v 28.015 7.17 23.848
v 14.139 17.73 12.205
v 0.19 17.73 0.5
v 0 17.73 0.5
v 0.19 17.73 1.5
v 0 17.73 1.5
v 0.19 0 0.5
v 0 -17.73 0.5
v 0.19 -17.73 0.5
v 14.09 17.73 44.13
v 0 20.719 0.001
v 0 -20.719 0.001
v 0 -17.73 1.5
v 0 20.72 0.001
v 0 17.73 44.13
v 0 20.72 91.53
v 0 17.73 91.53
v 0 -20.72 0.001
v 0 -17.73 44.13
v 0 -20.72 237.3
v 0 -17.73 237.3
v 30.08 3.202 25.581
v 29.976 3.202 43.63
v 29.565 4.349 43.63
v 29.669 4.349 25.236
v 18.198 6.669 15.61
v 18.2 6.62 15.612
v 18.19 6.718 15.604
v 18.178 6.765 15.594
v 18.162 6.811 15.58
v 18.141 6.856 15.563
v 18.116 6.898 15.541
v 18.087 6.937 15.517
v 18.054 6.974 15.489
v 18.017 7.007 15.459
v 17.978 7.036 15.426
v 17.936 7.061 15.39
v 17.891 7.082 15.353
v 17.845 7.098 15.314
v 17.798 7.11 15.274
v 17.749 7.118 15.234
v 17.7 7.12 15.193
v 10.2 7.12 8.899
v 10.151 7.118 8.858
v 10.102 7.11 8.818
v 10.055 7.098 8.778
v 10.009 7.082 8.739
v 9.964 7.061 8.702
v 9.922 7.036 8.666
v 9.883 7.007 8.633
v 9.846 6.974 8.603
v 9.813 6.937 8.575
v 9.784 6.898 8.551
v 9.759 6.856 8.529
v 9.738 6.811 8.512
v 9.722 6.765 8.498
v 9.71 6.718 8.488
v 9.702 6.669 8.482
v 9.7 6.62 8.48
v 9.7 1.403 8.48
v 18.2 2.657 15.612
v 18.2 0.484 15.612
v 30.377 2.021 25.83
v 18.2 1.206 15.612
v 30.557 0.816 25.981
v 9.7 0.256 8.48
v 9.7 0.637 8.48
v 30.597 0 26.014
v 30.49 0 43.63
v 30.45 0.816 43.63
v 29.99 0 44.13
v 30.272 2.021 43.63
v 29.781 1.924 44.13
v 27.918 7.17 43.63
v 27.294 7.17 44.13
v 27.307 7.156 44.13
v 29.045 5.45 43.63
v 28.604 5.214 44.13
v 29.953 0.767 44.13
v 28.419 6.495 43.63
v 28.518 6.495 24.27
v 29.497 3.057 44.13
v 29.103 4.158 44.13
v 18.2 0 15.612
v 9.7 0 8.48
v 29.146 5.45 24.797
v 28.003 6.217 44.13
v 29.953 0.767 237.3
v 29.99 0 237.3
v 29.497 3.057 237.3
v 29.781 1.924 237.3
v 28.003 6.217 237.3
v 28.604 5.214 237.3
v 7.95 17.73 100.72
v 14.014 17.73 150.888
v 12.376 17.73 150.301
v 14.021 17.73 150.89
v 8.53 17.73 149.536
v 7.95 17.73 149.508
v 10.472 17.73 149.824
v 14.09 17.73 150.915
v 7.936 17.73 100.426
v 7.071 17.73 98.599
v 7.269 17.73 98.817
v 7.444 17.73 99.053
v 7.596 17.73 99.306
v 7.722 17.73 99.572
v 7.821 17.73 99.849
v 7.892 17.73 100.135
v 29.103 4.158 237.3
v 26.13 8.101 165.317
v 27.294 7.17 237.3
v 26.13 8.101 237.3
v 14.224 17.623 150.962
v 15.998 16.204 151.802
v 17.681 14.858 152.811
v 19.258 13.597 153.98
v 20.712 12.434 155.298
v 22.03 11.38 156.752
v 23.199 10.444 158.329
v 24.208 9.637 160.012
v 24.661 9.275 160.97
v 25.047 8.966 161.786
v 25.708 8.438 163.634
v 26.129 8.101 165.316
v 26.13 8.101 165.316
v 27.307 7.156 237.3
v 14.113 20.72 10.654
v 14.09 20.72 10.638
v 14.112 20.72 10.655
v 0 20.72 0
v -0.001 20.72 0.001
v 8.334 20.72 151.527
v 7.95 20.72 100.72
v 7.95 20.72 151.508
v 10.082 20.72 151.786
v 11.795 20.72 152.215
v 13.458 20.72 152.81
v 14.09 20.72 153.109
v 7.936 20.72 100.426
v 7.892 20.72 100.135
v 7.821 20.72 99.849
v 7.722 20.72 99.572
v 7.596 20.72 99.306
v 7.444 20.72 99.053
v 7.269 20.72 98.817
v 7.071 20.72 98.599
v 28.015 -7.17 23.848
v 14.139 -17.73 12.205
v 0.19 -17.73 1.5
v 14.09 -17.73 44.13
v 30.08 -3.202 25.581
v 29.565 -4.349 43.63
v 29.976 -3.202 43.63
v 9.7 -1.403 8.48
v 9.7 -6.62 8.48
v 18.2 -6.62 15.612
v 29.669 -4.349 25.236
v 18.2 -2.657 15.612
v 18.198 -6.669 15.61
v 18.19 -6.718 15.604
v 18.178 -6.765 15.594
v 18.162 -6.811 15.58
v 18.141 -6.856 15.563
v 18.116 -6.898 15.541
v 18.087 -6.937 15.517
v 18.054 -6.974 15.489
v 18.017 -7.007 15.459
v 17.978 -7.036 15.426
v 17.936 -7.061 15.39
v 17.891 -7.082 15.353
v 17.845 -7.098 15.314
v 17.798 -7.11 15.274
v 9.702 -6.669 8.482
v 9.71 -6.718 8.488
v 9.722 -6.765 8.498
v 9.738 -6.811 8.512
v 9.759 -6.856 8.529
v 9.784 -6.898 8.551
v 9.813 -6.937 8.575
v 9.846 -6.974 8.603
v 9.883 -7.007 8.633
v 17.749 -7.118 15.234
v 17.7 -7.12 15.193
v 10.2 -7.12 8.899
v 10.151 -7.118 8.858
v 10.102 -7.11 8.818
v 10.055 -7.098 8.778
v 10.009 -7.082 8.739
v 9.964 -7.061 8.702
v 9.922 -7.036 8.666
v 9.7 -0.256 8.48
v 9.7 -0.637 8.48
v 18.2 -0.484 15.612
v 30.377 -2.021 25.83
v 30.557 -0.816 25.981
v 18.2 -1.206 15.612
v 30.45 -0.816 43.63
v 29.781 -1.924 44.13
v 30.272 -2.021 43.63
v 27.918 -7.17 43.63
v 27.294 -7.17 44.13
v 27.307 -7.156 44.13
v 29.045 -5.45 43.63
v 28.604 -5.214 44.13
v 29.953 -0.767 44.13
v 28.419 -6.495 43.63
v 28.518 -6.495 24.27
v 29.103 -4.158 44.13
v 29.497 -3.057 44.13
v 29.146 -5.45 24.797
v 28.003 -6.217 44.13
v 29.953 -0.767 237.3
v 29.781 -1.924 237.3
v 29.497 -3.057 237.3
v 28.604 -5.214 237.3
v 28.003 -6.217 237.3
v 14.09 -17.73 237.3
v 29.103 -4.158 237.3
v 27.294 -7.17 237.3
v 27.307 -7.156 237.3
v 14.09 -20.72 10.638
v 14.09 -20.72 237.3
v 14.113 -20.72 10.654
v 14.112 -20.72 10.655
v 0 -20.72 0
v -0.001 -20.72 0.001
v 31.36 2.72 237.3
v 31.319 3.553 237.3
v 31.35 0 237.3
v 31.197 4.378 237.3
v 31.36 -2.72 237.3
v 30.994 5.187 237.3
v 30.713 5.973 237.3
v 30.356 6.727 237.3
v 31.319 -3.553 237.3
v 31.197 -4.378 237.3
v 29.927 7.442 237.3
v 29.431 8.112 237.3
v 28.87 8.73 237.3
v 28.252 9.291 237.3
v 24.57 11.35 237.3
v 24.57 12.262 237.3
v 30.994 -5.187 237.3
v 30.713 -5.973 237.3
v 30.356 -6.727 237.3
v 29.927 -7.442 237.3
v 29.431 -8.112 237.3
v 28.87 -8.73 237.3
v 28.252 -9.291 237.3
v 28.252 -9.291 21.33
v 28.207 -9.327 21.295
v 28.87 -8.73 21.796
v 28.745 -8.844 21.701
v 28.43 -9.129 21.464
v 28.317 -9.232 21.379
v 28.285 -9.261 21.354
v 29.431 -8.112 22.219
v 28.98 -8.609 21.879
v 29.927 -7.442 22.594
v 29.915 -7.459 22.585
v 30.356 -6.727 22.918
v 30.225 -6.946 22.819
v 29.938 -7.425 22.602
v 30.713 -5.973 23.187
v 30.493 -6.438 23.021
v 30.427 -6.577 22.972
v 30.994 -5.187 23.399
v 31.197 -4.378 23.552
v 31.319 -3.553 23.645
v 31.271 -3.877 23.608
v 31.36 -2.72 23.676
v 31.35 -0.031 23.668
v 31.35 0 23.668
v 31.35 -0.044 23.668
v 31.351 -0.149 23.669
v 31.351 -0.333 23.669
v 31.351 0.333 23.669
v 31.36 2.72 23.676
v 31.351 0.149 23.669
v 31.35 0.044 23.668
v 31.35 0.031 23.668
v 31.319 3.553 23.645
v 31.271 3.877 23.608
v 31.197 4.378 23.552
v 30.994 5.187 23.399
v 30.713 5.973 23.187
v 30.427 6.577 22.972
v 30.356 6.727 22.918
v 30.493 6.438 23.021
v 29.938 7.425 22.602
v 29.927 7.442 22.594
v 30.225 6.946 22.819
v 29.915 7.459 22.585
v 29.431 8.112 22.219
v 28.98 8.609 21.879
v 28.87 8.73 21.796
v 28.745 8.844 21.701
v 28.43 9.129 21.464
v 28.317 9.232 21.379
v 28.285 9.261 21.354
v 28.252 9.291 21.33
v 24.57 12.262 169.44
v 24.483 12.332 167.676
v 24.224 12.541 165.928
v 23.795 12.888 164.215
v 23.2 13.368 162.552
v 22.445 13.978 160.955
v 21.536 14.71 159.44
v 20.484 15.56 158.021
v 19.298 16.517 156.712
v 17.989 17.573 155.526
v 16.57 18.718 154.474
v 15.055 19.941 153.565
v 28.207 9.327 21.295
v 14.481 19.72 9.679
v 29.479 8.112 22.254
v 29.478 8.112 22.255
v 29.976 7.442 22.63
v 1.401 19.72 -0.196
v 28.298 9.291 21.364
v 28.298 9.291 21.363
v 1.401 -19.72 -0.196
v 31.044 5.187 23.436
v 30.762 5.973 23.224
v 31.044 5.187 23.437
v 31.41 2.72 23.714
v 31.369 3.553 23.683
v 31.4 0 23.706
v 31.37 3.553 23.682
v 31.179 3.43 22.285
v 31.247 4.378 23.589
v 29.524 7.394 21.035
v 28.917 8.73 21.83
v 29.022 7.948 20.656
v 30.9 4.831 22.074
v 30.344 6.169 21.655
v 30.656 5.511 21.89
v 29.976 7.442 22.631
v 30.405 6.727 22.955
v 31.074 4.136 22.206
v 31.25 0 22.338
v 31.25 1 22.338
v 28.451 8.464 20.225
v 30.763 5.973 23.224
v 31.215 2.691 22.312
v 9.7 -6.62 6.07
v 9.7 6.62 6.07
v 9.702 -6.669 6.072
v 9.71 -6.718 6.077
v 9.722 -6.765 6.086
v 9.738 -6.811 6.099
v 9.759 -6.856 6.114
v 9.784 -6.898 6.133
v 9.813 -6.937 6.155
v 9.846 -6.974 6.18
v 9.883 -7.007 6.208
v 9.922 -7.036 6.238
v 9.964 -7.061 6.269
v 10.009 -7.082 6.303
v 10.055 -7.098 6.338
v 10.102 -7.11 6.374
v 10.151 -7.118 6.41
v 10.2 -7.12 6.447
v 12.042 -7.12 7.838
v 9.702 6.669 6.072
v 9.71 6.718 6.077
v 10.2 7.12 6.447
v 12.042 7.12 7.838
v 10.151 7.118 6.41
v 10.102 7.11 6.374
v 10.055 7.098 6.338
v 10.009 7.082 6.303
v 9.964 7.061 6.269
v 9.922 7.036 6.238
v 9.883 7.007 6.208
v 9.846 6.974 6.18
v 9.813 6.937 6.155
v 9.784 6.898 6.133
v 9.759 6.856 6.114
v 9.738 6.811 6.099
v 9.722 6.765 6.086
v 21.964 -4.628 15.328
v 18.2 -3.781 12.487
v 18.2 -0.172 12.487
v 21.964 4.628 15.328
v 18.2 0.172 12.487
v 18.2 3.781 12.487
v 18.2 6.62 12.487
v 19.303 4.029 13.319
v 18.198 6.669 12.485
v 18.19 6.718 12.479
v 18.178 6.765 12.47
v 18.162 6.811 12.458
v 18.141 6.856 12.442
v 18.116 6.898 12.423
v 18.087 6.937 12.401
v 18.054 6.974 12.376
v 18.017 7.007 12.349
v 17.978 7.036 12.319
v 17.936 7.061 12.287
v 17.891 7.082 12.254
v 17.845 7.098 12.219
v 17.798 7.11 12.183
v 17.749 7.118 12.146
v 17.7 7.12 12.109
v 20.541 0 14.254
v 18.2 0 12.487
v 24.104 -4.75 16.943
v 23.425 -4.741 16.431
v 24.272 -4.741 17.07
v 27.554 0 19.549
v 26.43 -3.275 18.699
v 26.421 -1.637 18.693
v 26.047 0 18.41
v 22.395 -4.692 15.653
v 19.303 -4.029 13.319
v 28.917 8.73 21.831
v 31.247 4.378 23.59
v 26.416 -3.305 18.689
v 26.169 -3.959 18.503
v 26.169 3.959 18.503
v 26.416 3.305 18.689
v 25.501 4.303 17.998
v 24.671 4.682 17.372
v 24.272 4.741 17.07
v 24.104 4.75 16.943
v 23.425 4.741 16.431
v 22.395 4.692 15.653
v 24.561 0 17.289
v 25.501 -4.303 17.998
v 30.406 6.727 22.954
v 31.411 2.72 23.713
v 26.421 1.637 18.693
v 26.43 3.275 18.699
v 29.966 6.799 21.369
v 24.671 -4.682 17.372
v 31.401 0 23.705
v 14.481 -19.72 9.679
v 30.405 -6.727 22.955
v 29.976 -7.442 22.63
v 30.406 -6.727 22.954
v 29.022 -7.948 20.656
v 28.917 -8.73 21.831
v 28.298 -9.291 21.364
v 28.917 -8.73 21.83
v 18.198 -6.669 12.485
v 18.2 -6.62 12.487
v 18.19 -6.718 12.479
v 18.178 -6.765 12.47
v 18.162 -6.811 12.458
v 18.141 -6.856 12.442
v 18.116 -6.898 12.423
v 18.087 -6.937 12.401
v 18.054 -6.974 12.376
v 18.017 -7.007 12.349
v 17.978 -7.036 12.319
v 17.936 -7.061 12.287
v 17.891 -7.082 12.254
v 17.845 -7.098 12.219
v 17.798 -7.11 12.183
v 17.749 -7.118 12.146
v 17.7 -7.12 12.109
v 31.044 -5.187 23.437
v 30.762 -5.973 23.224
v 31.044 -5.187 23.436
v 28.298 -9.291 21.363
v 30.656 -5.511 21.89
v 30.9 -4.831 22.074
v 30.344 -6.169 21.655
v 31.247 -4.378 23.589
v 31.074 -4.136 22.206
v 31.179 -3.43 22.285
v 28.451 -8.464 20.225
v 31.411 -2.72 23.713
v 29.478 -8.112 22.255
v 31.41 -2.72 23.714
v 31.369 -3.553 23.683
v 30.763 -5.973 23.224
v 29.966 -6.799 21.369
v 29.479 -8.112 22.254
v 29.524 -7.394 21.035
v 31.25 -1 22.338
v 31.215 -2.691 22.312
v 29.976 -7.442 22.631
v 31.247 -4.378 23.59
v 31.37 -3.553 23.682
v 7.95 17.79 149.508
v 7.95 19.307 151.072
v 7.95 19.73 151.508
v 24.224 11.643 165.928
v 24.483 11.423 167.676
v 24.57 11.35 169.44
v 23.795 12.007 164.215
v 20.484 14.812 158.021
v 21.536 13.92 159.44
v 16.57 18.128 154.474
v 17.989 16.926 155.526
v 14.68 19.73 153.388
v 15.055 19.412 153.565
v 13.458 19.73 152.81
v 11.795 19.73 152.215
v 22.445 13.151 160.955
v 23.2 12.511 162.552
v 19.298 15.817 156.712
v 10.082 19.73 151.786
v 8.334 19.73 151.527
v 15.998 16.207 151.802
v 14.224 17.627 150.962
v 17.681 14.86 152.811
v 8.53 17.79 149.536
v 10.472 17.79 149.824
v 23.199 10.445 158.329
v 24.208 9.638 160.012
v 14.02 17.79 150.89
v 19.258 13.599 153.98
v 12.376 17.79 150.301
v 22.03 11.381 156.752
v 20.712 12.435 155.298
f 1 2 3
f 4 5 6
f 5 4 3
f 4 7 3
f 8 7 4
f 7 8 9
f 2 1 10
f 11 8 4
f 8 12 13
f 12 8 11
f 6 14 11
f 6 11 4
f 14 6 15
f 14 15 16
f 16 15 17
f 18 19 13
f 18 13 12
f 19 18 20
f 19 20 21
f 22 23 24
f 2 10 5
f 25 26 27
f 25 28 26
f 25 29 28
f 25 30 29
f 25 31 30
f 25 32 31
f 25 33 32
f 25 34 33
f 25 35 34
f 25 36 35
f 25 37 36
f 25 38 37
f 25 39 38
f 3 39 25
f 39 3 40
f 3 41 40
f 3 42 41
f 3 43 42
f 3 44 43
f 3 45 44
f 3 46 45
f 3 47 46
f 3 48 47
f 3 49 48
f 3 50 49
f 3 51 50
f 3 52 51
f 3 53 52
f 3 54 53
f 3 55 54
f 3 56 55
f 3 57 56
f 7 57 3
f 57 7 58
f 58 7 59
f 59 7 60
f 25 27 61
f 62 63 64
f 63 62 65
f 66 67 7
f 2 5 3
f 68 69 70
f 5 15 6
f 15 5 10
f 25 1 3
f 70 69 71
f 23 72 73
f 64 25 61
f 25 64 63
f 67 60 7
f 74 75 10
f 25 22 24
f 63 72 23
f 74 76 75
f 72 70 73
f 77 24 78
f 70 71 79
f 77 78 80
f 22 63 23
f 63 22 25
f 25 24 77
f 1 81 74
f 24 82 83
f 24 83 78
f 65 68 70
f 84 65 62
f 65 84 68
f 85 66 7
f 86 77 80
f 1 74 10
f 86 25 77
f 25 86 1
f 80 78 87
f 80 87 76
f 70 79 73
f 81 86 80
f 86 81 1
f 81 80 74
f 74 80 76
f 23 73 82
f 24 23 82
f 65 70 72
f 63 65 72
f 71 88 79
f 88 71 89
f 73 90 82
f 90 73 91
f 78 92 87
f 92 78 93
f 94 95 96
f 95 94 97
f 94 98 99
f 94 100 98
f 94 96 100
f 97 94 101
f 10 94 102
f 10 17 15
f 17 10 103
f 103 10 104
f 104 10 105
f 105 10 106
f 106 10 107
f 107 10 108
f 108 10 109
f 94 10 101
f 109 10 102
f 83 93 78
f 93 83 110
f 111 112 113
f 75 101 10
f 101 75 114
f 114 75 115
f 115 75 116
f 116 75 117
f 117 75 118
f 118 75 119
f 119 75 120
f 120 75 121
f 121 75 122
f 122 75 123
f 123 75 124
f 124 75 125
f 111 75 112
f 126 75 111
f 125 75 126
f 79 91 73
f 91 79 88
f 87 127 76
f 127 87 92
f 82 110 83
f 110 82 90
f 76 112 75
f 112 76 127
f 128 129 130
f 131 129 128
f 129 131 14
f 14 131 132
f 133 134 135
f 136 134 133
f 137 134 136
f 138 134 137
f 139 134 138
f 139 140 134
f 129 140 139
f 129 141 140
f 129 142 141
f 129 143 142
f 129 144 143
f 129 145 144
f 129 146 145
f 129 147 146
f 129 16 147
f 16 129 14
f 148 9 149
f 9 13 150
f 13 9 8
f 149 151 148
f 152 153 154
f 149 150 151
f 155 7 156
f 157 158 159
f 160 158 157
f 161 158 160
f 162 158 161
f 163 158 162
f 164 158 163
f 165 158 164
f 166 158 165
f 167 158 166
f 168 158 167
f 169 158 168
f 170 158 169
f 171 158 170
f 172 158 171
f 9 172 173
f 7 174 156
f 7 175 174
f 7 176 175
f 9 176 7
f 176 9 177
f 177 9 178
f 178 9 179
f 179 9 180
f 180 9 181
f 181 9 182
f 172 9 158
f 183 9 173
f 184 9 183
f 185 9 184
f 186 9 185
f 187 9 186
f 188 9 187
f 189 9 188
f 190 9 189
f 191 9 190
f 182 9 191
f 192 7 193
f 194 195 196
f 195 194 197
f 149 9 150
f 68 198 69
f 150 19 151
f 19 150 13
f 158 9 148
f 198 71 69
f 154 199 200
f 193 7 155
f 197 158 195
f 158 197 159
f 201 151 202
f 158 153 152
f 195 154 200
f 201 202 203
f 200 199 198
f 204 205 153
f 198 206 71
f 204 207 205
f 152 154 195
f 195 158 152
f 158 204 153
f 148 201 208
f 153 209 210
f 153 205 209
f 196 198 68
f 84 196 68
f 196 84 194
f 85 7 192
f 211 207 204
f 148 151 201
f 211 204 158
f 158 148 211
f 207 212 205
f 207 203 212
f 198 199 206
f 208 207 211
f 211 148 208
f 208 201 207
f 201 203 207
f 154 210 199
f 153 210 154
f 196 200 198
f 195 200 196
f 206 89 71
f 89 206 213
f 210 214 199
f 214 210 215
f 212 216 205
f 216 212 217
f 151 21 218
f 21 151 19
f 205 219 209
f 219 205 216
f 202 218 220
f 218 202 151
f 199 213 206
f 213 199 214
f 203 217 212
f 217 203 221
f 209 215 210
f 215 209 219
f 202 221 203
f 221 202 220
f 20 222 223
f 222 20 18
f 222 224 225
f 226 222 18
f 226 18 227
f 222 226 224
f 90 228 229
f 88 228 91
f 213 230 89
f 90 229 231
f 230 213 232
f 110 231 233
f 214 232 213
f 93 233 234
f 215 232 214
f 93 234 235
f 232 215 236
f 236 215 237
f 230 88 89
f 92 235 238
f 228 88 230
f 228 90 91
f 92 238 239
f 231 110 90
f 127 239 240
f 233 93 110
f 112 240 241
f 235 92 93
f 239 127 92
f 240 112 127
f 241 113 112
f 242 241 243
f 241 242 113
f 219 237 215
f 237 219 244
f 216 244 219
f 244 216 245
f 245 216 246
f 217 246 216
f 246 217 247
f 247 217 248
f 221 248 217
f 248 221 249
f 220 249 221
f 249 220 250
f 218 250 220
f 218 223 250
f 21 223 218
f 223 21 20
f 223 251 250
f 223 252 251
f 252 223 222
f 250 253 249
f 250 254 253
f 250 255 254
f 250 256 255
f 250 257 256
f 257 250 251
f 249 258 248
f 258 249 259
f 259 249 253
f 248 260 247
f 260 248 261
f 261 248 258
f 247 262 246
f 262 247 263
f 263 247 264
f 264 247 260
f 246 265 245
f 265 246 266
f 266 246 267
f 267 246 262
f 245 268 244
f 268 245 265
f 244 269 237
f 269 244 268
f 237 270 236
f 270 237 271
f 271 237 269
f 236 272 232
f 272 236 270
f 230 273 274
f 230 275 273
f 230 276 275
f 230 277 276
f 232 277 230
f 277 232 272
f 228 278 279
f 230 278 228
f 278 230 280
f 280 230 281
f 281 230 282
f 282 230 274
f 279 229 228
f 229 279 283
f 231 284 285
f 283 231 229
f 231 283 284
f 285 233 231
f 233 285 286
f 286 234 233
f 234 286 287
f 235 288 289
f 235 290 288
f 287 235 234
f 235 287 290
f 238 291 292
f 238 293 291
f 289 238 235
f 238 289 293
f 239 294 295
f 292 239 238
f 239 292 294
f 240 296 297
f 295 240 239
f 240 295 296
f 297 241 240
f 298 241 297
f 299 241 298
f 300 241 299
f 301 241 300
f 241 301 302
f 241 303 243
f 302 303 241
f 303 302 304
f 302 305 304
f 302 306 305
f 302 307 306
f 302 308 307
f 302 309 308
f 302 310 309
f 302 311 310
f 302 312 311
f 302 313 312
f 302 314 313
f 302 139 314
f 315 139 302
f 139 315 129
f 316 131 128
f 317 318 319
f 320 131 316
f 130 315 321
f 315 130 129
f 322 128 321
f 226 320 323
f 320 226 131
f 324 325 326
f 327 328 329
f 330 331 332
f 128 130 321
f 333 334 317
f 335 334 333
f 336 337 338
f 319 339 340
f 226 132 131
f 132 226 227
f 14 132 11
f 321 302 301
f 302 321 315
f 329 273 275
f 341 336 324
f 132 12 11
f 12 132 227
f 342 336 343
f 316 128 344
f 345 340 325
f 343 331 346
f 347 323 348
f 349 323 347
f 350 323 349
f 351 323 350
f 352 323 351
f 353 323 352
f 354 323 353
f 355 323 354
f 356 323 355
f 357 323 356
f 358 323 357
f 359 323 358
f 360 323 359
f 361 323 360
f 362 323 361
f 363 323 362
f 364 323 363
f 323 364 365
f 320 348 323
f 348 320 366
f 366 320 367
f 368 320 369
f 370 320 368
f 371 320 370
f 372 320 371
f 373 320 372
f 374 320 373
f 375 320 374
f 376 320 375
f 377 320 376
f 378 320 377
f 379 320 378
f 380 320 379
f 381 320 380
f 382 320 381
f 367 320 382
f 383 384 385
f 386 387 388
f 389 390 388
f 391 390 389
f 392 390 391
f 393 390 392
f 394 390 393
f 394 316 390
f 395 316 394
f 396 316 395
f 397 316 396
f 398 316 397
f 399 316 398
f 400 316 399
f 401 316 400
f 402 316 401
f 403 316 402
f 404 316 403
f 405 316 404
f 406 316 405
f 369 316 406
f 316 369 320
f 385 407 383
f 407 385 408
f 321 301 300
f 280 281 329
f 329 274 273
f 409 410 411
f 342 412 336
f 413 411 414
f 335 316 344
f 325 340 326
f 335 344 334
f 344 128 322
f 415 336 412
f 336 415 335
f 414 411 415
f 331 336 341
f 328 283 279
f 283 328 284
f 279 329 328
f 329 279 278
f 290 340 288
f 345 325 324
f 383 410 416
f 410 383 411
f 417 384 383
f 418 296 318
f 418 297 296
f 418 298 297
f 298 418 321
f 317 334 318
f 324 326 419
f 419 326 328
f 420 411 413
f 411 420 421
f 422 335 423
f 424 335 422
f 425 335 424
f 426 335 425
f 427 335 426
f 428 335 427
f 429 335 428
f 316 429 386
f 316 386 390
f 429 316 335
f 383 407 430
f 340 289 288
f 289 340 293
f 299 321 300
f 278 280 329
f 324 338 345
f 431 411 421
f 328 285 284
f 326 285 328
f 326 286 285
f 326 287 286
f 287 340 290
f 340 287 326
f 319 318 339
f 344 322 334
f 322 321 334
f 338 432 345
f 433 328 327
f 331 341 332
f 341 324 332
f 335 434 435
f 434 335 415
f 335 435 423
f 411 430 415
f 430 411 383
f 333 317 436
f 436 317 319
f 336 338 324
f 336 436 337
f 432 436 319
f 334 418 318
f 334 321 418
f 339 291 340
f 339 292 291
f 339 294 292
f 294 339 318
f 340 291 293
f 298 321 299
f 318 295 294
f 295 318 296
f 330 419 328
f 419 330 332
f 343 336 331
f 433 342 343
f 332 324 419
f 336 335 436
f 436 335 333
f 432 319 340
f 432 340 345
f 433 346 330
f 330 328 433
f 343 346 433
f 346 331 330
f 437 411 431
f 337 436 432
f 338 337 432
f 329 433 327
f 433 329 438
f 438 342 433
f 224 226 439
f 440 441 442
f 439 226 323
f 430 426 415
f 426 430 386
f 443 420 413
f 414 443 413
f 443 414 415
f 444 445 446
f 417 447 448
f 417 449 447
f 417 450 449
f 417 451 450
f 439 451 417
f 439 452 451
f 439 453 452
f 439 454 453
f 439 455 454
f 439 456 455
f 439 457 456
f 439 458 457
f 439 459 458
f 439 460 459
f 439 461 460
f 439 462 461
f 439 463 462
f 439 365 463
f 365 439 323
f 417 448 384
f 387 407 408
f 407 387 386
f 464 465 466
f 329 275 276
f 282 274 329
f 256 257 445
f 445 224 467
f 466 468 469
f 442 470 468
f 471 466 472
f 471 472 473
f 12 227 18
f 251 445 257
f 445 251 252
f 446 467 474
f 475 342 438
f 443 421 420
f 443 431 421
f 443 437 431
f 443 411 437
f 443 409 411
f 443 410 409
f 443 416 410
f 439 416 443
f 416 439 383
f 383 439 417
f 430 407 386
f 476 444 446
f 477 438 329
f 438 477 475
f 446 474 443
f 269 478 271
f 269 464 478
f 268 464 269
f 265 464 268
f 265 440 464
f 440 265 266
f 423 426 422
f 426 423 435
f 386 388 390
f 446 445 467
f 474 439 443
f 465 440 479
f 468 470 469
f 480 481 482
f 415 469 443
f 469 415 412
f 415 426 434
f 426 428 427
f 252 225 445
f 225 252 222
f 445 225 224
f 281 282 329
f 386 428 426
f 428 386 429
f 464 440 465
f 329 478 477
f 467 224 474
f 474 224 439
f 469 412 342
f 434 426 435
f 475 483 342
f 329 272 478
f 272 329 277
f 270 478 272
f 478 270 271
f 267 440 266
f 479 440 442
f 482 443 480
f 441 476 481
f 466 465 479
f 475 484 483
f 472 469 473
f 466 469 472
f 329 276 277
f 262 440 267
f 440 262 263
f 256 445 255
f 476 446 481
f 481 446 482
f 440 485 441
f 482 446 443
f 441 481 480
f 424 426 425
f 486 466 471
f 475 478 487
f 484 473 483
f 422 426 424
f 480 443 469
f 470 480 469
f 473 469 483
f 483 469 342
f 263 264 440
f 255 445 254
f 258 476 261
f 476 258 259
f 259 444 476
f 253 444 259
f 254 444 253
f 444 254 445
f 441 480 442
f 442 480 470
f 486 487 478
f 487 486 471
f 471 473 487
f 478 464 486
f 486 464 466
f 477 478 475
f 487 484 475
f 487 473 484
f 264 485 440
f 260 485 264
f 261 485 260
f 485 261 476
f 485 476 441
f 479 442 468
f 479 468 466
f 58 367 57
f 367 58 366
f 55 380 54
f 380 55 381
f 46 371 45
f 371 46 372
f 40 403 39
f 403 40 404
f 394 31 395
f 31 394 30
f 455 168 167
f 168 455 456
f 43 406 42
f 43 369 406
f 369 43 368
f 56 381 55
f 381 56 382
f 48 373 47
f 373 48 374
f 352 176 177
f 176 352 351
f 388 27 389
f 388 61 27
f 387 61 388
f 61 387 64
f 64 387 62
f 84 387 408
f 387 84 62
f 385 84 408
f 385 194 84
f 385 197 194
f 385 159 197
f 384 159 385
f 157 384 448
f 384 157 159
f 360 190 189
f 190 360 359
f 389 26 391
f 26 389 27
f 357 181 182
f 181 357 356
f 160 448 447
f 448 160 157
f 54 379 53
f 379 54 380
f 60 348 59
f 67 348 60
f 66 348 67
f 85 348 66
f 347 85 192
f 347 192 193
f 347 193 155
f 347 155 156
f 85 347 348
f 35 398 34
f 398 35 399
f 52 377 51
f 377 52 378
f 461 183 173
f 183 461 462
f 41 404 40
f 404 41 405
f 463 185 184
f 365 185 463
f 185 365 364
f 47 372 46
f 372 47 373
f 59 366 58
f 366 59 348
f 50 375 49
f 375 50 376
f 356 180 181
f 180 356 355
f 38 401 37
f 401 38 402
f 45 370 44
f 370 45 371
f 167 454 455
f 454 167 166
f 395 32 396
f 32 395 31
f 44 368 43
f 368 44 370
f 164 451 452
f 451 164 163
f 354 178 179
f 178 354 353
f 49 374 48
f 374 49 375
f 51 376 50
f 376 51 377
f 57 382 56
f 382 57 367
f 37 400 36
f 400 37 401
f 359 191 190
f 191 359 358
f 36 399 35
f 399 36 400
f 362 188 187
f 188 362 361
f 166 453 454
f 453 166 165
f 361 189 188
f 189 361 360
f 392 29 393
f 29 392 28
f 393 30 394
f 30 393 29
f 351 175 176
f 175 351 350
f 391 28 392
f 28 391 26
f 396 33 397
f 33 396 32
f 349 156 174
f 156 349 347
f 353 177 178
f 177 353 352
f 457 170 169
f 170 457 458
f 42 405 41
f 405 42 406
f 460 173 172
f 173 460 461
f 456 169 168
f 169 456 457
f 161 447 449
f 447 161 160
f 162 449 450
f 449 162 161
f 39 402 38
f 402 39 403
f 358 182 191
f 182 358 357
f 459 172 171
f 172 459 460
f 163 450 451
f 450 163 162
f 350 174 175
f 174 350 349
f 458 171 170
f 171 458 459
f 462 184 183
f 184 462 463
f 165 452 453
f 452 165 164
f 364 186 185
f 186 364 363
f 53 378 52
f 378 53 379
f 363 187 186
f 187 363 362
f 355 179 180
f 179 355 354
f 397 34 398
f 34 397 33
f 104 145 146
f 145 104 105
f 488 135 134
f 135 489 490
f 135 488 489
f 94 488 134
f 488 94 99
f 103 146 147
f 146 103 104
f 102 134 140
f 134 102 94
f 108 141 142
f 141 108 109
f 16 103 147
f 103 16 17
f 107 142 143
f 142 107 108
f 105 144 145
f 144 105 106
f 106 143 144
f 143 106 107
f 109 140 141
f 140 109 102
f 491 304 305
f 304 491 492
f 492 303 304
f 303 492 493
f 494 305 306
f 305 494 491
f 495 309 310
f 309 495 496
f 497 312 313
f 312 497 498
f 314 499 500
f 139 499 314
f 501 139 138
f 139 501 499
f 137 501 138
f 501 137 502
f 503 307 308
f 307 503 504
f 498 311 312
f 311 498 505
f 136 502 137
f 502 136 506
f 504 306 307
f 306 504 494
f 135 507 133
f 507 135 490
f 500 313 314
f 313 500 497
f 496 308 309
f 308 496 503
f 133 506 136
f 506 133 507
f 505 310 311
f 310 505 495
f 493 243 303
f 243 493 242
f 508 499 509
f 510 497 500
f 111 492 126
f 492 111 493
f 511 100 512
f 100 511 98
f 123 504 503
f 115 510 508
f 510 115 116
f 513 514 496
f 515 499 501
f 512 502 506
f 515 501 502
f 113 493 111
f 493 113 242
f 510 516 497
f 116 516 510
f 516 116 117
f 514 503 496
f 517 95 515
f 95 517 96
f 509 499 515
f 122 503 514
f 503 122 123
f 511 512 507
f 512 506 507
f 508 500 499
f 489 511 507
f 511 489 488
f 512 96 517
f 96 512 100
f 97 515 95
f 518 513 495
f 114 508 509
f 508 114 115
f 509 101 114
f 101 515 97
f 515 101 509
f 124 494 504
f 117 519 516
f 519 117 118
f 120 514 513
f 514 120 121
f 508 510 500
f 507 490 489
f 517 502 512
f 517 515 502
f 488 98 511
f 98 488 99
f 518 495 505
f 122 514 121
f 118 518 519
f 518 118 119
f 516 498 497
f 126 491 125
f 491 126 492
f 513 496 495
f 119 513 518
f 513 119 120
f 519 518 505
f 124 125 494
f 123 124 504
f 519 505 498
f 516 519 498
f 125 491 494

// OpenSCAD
// file: header.scad
////INTERSECTION MODULE////
//http://forum.openscad.org/intersection-children-0-children-1-does-a-union-instead-of-an-intersection-td8998.html
$fn=64;

module i(){
    intersection_for(i=[0:$children-1]){
        children(i);
    }
}

////UNION MODULE////
module u(){
    union(){
        children([0:$children-1]);
    }
}
///DIFFERENCE MODULE////
module d(){
    difference(){
        children(0);
        children([1:$children-1]);
    }
}
////HULL MODULE////
module h(){
    hull(){
        children([0:$children-1]);
    }
}
////LINEAR_EXRTRUDE MODULE////
module e(z,s){
    linear_extrude(z,scale=s)children();
}
////TRANSLATE MODULE////
module t(x,y,z){
    if(x==undef){children();}
    else{
        //if x is defined (we assume y is too) but not z we translate in 2D
        if(z==undef)translate([x,y])children();
        //If z is defined we translate in 3D
        else translate([x,y,z])children();
        }
}

//////CIRCLE MODULE////
module c(r,x,y){
    t(x,y)circle(r=r);
}

////SQUARE MODULE////
module s(h,w,x,y){
    t(x,y)square([h,w]);
}

////ROTATE MODULE////
module r(x){
    rotate(x)children();
}

////TORRUS MODULE////
module o(i,o,x,y,z){
    t(x,y,z) rotate_extrude()
    t(i+(o-i)/2,0,0)c((o-i)/2+.001);
}


////COPY-MIRROR MODULE////
module m(v){
    children();
    mirror(v)children();
}
////CUBE MODULE////
module q(h,w,l,x,y,z){
    t(x,y,z)cube([h,w,l]);
}

////CYLINDER MODULE////
module l(r,h,x,y,z){
    t(x,y,z)cylinder(r=r,h=h);
}

////Sphere
module p(r,x,y,z){
     t(x,y,z)sphere(r=r);
}

///cut an arc
module a(d){
    i(){
        children();
        rotate_extrude(angle=d,$fn=16)s(120,120);
    }
}

///Scale
module z(x,y,z){
    if(y==undef)scale(x)children();
    else scale([x,y,z])children();
}


module W(i){///fillet for front
    t(0,0,-2.5*sin(11.25*i)-1)e(1){offset(r=2.5-2.5*cos(11.25*i))scale([9.79,1,1])c(1.08);};
}

////profiles for cover
module X(){
    h(){
        s(14.09,17.73);
        s(1,1);
        i(){
            c(11.91,18.1,-.4);
            s(30,7.17);
        }
    }
}
module Y(){
    h(){
        s(14.09,17.73);
        s(1,1);
        i(){
            c(12.41,18.1,-.4);
            s(30.5,7.17);
        }
    }
}
module Z(){
    h(){
        c(8.5,22.86,2.72);
        s(14.09,20.72);
        s(31.35,1);
    }
}
// main file
include<header.scad>

d(){
    u(){
        d(){
            e(237.3)m([0,1,0])Z();
            m([0,1,0]){
                h(){
                    t(.19,0,.5)r([0,-40,0])e(.1)z([1.31,1])//39.57/(30.5-.19)
                    t(-.19,0)d(){
                        Y();
                        s(.19,90);
                    }
                    q(.19,17.73,1,0,0,.5);
                    t(0,0,42.63)e(1)Y();
                    t(0,0,43.13)e(1)X();
                }
                t(0,0,44.13)e(194)X();
                
                h(){
                    r([0,-37.05,0])e(.001)z([39.35,1])Z();//31.35/cos(37.05)
                    t(0,0,-1)e(1)Z();
                }
            }
        }
        //back
        m([0,1,0])h(){
            r([0,-37.05,0]){
                e(.001)z([1.255,1])Z();//(31.35/cos(37.05))/31.35
                t(0,0,-1)e(1){
                    offset(-1)z([1.255,1])Z();
                    s(37.4,1,1,0);
                }
            }
        }
    }
    //side cutout
    h(){
        m([0,1,0])for(i=[10.2,17.7]){
            l(.5,20,i,6.62);
        }
    }
       h(){
        r([-90,0,0])l(3,20.72,4.95,-100.72,0);
        q(1,20.72,145.77,-1,0,91.53);
        q(7.95,20.72,1,0,0,237.3);
    }
    r([-90,0,0])l(18,20.72,6.57,-169.44);
    q(24.57,20.72,100,0,0,169.44);
    h(){
        i(){
            r([-90,0,0])l(18,20.72,6.57,-169.44);
            h(){
                q(14.68,19.73,169.44);
                q(24.57,11.35,169.44);
            }
        }
        i(){
            r([-90,0,0])l(20,20.72,6.57,-169.44);
            h(){
                q(14.02,17.79,169.44);
                q(26.13,8.1,169.44);
            }
        }
    }
    ///back cutout
    h(){
        q(26.13,8.1,90,0,0,169.44);
        q(24.57,11.35,90,0,0,169.44);
    }
}
